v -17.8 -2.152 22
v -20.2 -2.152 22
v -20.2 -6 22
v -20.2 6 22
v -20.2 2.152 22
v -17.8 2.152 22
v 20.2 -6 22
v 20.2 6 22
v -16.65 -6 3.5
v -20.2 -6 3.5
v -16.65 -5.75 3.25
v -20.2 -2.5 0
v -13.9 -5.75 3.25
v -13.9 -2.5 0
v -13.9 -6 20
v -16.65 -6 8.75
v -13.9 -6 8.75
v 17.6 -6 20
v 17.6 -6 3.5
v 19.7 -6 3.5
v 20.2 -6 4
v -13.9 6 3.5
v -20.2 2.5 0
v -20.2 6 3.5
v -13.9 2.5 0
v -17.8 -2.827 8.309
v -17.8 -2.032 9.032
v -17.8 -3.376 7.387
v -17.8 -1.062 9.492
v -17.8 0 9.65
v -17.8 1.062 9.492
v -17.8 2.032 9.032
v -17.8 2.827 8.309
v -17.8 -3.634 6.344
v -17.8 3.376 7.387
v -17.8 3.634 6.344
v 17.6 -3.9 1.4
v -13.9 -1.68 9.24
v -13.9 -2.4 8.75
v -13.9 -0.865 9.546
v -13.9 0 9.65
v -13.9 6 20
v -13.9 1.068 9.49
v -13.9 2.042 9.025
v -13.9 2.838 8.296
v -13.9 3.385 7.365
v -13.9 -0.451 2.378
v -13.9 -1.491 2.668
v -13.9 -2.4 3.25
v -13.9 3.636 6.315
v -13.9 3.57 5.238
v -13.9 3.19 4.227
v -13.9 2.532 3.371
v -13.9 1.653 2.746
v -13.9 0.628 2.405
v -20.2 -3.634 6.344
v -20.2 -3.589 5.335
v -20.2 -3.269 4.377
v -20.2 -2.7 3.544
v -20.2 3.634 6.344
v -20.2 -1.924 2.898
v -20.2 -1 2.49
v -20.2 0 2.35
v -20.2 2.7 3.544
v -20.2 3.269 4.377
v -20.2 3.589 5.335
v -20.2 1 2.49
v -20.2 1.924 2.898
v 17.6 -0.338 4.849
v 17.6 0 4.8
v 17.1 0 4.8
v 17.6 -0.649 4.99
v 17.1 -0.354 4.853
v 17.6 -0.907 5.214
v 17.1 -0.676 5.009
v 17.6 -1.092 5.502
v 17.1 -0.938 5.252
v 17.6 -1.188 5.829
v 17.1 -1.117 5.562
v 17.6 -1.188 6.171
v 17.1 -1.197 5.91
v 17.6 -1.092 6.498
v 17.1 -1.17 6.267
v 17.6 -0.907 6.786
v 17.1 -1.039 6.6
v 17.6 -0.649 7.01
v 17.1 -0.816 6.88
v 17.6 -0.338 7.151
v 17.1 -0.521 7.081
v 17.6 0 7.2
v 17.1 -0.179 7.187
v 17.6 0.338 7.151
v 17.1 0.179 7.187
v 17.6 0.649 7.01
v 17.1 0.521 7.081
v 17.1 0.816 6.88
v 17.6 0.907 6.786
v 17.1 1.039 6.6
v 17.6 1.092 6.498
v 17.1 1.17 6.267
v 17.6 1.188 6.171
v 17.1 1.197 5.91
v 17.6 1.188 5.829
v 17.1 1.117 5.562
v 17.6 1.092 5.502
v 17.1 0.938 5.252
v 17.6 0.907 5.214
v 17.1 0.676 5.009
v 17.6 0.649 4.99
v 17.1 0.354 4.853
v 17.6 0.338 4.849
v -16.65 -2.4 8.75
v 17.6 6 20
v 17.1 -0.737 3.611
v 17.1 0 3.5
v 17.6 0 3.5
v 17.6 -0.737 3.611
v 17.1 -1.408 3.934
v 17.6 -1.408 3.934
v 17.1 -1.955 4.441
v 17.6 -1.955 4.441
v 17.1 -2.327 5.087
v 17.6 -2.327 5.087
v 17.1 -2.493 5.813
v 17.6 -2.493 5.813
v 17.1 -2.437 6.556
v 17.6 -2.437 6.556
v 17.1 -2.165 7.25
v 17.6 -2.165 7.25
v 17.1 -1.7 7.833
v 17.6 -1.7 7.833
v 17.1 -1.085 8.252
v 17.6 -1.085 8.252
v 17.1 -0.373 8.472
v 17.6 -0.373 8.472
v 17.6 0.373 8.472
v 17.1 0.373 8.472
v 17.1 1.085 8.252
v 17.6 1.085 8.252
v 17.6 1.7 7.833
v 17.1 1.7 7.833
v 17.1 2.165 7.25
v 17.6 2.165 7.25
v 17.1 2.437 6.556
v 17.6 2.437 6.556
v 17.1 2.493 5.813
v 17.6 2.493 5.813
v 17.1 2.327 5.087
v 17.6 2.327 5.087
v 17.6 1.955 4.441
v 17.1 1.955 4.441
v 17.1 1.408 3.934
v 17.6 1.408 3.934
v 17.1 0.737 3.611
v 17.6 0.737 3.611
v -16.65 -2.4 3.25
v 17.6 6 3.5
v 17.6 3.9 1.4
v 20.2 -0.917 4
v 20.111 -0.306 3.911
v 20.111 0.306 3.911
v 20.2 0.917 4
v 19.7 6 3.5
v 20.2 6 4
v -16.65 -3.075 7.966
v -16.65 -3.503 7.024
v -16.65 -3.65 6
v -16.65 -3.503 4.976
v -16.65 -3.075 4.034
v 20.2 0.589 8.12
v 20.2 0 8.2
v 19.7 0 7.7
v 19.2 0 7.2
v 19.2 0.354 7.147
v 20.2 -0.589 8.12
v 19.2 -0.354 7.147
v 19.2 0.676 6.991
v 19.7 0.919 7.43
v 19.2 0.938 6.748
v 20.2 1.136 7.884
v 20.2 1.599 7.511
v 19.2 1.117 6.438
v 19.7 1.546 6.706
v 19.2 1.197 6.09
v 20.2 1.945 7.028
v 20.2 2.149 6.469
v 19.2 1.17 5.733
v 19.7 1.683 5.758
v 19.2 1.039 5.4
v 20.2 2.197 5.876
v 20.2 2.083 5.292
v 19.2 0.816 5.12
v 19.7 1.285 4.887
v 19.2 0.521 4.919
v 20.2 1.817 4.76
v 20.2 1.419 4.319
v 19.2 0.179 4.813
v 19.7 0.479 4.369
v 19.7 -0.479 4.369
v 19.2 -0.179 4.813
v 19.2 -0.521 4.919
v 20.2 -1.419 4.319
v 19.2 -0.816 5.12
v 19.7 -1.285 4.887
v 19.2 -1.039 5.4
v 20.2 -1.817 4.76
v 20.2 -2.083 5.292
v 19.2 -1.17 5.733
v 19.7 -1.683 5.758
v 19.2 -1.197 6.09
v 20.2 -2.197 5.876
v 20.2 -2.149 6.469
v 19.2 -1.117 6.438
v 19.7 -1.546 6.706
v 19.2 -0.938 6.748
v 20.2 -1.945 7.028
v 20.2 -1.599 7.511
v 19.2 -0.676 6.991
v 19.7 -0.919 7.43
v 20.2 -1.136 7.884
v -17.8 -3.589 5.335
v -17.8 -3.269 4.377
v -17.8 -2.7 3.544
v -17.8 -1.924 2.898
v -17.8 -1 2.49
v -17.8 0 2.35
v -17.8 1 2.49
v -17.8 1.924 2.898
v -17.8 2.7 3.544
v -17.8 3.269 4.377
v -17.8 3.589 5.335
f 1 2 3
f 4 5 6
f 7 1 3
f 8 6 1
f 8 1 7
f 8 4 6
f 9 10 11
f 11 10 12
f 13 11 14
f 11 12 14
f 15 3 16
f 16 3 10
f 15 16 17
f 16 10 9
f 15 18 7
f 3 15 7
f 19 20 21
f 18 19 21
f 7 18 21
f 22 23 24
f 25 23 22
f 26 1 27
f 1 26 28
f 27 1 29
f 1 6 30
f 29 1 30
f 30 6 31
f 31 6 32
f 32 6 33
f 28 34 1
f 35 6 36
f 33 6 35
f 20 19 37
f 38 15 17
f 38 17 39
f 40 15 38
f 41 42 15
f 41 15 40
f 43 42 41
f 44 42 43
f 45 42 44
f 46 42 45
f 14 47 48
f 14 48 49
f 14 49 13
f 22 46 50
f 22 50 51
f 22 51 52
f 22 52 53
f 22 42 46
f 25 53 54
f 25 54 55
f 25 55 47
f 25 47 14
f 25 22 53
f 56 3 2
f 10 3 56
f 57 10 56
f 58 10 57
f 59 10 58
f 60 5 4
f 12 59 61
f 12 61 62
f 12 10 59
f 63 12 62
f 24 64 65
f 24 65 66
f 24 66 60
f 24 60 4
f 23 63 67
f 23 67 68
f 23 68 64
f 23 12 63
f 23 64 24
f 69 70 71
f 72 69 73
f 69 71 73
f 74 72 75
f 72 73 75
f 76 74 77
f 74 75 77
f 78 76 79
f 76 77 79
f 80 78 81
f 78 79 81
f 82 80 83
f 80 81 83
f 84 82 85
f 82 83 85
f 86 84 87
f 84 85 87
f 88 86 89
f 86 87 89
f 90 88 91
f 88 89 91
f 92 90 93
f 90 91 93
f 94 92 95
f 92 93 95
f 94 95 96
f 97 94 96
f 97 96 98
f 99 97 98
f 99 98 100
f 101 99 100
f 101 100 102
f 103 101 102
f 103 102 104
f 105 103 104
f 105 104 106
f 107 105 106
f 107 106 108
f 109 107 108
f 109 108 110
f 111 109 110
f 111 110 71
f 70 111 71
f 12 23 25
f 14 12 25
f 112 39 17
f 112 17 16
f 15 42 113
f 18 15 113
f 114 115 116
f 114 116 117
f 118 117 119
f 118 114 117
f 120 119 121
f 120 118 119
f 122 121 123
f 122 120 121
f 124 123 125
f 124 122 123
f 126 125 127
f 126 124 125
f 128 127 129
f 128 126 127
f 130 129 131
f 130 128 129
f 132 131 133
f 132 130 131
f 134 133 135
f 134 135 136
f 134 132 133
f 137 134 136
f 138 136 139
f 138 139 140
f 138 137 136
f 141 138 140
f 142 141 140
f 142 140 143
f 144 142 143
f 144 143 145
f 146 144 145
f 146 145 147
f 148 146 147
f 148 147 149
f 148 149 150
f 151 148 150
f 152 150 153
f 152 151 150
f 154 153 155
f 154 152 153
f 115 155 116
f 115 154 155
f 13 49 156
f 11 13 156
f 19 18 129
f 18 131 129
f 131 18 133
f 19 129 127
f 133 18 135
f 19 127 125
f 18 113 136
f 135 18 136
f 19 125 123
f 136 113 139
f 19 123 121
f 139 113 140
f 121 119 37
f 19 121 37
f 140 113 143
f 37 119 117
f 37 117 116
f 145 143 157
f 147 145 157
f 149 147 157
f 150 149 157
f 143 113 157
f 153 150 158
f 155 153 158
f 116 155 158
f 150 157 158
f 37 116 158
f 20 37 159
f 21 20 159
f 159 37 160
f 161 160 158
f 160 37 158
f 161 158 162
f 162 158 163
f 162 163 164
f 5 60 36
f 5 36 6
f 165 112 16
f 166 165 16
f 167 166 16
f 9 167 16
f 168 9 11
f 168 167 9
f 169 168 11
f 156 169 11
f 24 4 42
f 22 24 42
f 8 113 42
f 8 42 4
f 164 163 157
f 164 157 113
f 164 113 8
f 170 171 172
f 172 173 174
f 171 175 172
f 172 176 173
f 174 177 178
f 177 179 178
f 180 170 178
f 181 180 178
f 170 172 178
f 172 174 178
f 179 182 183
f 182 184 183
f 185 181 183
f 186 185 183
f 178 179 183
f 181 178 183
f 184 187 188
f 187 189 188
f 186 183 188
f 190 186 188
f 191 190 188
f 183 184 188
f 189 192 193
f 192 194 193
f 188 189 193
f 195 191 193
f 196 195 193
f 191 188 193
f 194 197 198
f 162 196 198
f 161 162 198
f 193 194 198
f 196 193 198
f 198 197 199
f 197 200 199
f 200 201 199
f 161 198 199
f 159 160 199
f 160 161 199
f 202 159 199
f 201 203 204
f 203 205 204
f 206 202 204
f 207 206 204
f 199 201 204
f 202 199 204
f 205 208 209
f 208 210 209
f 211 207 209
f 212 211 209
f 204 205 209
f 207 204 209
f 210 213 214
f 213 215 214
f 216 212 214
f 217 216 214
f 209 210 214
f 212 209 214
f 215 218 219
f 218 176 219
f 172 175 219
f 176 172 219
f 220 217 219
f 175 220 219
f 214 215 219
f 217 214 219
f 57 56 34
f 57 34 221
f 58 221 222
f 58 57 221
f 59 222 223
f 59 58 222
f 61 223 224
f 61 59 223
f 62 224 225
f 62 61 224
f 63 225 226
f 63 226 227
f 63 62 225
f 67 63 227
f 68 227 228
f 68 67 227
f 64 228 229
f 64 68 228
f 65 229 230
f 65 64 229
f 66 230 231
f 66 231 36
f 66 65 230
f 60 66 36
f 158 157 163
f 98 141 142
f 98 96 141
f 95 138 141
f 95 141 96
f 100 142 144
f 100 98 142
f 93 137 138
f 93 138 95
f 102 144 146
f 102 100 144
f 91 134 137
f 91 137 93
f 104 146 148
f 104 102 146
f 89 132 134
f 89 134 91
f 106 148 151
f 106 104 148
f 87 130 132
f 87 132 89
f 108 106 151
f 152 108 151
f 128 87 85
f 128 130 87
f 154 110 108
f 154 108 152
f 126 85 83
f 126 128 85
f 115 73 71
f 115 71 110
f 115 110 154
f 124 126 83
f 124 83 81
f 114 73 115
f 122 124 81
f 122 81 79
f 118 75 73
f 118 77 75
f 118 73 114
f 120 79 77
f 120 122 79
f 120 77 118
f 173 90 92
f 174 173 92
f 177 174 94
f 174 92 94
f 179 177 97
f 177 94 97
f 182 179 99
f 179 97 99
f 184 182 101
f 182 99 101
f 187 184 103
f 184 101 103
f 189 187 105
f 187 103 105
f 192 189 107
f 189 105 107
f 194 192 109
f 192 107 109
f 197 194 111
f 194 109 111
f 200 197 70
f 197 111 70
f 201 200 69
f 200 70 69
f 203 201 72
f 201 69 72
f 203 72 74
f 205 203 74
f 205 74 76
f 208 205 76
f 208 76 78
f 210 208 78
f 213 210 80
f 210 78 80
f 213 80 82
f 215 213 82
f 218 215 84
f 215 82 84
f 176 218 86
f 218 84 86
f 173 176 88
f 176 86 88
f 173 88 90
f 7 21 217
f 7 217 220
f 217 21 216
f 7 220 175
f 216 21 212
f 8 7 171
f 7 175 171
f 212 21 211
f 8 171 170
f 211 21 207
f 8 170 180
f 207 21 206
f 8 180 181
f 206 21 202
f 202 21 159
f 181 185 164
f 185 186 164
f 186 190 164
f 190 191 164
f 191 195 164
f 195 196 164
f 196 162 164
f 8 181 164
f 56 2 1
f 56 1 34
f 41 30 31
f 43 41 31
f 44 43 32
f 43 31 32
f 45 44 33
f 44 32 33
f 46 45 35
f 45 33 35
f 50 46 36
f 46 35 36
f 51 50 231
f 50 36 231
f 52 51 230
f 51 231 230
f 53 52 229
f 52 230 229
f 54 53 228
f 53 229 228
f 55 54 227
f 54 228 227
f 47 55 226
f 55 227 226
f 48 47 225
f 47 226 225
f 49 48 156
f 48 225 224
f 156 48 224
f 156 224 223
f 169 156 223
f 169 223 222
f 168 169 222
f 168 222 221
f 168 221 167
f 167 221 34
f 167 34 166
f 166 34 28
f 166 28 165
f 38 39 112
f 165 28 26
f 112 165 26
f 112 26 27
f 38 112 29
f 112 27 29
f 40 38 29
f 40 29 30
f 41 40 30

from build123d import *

# Parameters (mm, degrees)
SKETCH1_W                                       = 40.4
SKETCH1_H                                       = 12
BOSS_EXTRUDE1_DEPTH                             = 22
CUT_EXTRUDE1_REACH                              = 34.188
SKETCH2_W                                       = 31.5
SKETCH2_H                                       = 20
CUT_EXTRUDE2_REACH                              = 48.391
SKETCH4_R                                       = 0.9
CHAMFER1_SIZE                                   = 3.5
CSK_FOR_M2_FLAT_HEAD_MACHINE_SCREW1_D           = 2.4
CSK_FOR_M2_FLAT_HEAD_MACHINE_SCREW1_DEPTH       = 12.7
CSK_FOR_M2_FLAT_HEAD_MACHINE_SCREW1_CSINK_D     = 4.4
CSK_FOR_M2_FLAT_HEAD_MACHINE_SCREW1_CSINK_ANGLE = 90
CSK_FOR_M2_FLAT_HEAD_MACHINE_SCREW1_TIP         = 0.721032743
CHAMFER2_SIZE                                   = 4
BOSS_EXTRUDE2_START                             = 0.5
SKETCH20_R                                      = 2.5
SKETCH20_R_2                                    = 1.2
BOSS_EXTRUDE2_DEPTH                             = 0.5
CUT_EXTRUDE3_DEPTH                              = 2.4
SKETCH23_R                                      = 3.65
CUT_EXTRUDE4_DEPTH                              = 22.4
SKETCH24_W                                      = 5.5
SKETCH24_H                                      = 5.5
CUT_EXTRUDE5_DEPTH                              = 22.4


with BuildPart() as part:
    # Sketch1 → Boss-Extrude1 (new body)
    with BuildSketch(Plane.XY):
        Rectangle(SKETCH1_W, SKETCH1_H)
    extrude(amount=BOSS_EXTRUDE1_DEPTH)

    # Sketch2 → Cut-Extrude1 (cut, up to next)
    with BuildSketch(Plane(origin=(0, 6, 0), x_dir=(1, 0, 0), z_dir=(0, 1, 0)), mode=Mode.PRIVATE) as cut_extrude1_sk1:
        with Locations((1.85, -10)):
            Rectangle(SKETCH2_W, SKETCH2_H)
    cut_extrude1_tool1 = extrude(cut_extrude1_sk1.sketch, amount=-CUT_EXTRUDE1_REACH, mode=Mode.PRIVATE) & part.part
    add(cut_extrude1_tool1.solids().sort_by_distance((1.85, 6, 10))[0], mode=Mode.SUBTRACT)

    # Sketch4 → Cut-Extrude2 (cut, up to next)
    with BuildSketch(Plane(origin=(20.2, 0, 0), x_dir=(0, 0, -1), z_dir=(1, 0, 0)), mode=Mode.PRIVATE) as cut_extrude2_sk1:
        with Locations((-6, 0)):
            Circle(SKETCH4_R)
    cut_extrude2_tool1 = extrude(cut_extrude2_sk1.sketch, amount=-CUT_EXTRUDE2_REACH, mode=Mode.PRIVATE) & part.part
    add(cut_extrude2_tool1.solids().sort_by_distance((20.2, 0, 6))[0], mode=Mode.SUBTRACT)

    # Chamfer1
    chamfer1_edges = [part.edges().sort_by_distance(p)[0] for p in [
        (-17.05, -6, 0),
        (-17.05, 6, 0),
        (18.9, -6, 0),
        (18.9, 6, 0),
    ]]
    chamfer(chamfer1_edges, length=CHAMFER1_SIZE)

    # CSK for M2 Flat Head Machine Screw1
    with Locations(Plane(origin=(20.2, 0, 0), x_dir=(0, 0, -1), z_dir=(1, 0, 0))):
        with Locations((-6, 0)):
            CounterSinkHole(CSK_FOR_M2_FLAT_HEAD_MACHINE_SCREW1_D / 2, CSK_FOR_M2_FLAT_HEAD_MACHINE_SCREW1_CSINK_D / 2, depth=CSK_FOR_M2_FLAT_HEAD_MACHINE_SCREW1_DEPTH, counter_sink_angle=CSK_FOR_M2_FLAT_HEAD_MACHINE_SCREW1_CSINK_ANGLE)
            with Locations((0, 0, -(CSK_FOR_M2_FLAT_HEAD_MACHINE_SCREW1_DEPTH + CSK_FOR_M2_FLAT_HEAD_MACHINE_SCREW1_TIP / 2))):  # 118° drill point
                Cone(0, CSK_FOR_M2_FLAT_HEAD_MACHINE_SCREW1_D / 2, CSK_FOR_M2_FLAT_HEAD_MACHINE_SCREW1_TIP, mode=Mode.SUBTRACT)

    # Chamfer2
    # the kernel refuses this chamfer: 4 mm, written as the material it takes off along each edge
    with BuildSketch(Plane(origin=(20.2, 12.786731952, 0), x_dir=(-0.9996219169112968, 0, -0.027495876610586365), z_dir=(0, -1, 0))) as chamfer2_piece_1:
        Polygon((CHAMFER2_SIZE * 0.999621916911, -CHAMFER2_SIZE * 0.0274958766106), (-CHAMFER2_SIZE * 0.0274958766106, -CHAMFER2_SIZE * 0.999621916911), (0, 0), align=None)
    extrude(amount=25.573463904, mode=Mode.SUBTRACT)

    # Sketch20 → Boss-Extrude2 (add)
    with BuildSketch(Plane.ZY.offset(-17.6).offset(BOSS_EXTRUDE2_START)):
        with Locations(Location((6, 0, 0), (0, 0, 180))):
            Circle(SKETCH20_R)
        with Locations(Location((6, 0, 0), (0, 0, 180))):
            Circle(SKETCH20_R_2, mode=Mode.SUBTRACT)
    extrude(amount=-BOSS_EXTRUDE2_DEPTH)

    # Sketch5 → Cut-Extrude3 (cut)
    with BuildSketch(Plane.ZY.offset(20.2)):
        with BuildLine():
            Line((6.343920973, 3.633760912), (22.64787234, 2.090656963))
            ThreePointArc((22.64787234, 2.090656963), (24.55, 0), (22.64787234, -2.090656963))
            Line((22.64787234, -2.090656963), (6.343920973, -3.633760912))
            ThreePointArc((6.343920973, -3.633760912), (2.35, 0), (6.343920973, 3.633760912))
        make_face()
    extrude(amount=-CUT_EXTRUDE3_DEPTH, mode=Mode.SUBTRACT)

    # Sketch23 → Cut-Extrude4 (cut)
    with BuildSketch(Plane.ZY.offset(17.8)):
        with Locations((6, 0)):
            Circle(SKETCH23_R)
    extrude(amount=-CUT_EXTRUDE4_DEPTH, mode=Mode.SUBTRACT)

    # Sketch24 → Cut-Extrude5 (cut)
    with BuildSketch(Plane(origin=(0, 0, 0), x_dir=(-1, 0, 0), z_dir=(0, -1, 0))):
        with Locations((13.9, -6)):
            Rectangle(SKETCH24_W, SKETCH24_H)
    extrude(amount=CUT_EXTRUDE5_DEPTH, mode=Mode.SUBTRACT)


solid = part.part
